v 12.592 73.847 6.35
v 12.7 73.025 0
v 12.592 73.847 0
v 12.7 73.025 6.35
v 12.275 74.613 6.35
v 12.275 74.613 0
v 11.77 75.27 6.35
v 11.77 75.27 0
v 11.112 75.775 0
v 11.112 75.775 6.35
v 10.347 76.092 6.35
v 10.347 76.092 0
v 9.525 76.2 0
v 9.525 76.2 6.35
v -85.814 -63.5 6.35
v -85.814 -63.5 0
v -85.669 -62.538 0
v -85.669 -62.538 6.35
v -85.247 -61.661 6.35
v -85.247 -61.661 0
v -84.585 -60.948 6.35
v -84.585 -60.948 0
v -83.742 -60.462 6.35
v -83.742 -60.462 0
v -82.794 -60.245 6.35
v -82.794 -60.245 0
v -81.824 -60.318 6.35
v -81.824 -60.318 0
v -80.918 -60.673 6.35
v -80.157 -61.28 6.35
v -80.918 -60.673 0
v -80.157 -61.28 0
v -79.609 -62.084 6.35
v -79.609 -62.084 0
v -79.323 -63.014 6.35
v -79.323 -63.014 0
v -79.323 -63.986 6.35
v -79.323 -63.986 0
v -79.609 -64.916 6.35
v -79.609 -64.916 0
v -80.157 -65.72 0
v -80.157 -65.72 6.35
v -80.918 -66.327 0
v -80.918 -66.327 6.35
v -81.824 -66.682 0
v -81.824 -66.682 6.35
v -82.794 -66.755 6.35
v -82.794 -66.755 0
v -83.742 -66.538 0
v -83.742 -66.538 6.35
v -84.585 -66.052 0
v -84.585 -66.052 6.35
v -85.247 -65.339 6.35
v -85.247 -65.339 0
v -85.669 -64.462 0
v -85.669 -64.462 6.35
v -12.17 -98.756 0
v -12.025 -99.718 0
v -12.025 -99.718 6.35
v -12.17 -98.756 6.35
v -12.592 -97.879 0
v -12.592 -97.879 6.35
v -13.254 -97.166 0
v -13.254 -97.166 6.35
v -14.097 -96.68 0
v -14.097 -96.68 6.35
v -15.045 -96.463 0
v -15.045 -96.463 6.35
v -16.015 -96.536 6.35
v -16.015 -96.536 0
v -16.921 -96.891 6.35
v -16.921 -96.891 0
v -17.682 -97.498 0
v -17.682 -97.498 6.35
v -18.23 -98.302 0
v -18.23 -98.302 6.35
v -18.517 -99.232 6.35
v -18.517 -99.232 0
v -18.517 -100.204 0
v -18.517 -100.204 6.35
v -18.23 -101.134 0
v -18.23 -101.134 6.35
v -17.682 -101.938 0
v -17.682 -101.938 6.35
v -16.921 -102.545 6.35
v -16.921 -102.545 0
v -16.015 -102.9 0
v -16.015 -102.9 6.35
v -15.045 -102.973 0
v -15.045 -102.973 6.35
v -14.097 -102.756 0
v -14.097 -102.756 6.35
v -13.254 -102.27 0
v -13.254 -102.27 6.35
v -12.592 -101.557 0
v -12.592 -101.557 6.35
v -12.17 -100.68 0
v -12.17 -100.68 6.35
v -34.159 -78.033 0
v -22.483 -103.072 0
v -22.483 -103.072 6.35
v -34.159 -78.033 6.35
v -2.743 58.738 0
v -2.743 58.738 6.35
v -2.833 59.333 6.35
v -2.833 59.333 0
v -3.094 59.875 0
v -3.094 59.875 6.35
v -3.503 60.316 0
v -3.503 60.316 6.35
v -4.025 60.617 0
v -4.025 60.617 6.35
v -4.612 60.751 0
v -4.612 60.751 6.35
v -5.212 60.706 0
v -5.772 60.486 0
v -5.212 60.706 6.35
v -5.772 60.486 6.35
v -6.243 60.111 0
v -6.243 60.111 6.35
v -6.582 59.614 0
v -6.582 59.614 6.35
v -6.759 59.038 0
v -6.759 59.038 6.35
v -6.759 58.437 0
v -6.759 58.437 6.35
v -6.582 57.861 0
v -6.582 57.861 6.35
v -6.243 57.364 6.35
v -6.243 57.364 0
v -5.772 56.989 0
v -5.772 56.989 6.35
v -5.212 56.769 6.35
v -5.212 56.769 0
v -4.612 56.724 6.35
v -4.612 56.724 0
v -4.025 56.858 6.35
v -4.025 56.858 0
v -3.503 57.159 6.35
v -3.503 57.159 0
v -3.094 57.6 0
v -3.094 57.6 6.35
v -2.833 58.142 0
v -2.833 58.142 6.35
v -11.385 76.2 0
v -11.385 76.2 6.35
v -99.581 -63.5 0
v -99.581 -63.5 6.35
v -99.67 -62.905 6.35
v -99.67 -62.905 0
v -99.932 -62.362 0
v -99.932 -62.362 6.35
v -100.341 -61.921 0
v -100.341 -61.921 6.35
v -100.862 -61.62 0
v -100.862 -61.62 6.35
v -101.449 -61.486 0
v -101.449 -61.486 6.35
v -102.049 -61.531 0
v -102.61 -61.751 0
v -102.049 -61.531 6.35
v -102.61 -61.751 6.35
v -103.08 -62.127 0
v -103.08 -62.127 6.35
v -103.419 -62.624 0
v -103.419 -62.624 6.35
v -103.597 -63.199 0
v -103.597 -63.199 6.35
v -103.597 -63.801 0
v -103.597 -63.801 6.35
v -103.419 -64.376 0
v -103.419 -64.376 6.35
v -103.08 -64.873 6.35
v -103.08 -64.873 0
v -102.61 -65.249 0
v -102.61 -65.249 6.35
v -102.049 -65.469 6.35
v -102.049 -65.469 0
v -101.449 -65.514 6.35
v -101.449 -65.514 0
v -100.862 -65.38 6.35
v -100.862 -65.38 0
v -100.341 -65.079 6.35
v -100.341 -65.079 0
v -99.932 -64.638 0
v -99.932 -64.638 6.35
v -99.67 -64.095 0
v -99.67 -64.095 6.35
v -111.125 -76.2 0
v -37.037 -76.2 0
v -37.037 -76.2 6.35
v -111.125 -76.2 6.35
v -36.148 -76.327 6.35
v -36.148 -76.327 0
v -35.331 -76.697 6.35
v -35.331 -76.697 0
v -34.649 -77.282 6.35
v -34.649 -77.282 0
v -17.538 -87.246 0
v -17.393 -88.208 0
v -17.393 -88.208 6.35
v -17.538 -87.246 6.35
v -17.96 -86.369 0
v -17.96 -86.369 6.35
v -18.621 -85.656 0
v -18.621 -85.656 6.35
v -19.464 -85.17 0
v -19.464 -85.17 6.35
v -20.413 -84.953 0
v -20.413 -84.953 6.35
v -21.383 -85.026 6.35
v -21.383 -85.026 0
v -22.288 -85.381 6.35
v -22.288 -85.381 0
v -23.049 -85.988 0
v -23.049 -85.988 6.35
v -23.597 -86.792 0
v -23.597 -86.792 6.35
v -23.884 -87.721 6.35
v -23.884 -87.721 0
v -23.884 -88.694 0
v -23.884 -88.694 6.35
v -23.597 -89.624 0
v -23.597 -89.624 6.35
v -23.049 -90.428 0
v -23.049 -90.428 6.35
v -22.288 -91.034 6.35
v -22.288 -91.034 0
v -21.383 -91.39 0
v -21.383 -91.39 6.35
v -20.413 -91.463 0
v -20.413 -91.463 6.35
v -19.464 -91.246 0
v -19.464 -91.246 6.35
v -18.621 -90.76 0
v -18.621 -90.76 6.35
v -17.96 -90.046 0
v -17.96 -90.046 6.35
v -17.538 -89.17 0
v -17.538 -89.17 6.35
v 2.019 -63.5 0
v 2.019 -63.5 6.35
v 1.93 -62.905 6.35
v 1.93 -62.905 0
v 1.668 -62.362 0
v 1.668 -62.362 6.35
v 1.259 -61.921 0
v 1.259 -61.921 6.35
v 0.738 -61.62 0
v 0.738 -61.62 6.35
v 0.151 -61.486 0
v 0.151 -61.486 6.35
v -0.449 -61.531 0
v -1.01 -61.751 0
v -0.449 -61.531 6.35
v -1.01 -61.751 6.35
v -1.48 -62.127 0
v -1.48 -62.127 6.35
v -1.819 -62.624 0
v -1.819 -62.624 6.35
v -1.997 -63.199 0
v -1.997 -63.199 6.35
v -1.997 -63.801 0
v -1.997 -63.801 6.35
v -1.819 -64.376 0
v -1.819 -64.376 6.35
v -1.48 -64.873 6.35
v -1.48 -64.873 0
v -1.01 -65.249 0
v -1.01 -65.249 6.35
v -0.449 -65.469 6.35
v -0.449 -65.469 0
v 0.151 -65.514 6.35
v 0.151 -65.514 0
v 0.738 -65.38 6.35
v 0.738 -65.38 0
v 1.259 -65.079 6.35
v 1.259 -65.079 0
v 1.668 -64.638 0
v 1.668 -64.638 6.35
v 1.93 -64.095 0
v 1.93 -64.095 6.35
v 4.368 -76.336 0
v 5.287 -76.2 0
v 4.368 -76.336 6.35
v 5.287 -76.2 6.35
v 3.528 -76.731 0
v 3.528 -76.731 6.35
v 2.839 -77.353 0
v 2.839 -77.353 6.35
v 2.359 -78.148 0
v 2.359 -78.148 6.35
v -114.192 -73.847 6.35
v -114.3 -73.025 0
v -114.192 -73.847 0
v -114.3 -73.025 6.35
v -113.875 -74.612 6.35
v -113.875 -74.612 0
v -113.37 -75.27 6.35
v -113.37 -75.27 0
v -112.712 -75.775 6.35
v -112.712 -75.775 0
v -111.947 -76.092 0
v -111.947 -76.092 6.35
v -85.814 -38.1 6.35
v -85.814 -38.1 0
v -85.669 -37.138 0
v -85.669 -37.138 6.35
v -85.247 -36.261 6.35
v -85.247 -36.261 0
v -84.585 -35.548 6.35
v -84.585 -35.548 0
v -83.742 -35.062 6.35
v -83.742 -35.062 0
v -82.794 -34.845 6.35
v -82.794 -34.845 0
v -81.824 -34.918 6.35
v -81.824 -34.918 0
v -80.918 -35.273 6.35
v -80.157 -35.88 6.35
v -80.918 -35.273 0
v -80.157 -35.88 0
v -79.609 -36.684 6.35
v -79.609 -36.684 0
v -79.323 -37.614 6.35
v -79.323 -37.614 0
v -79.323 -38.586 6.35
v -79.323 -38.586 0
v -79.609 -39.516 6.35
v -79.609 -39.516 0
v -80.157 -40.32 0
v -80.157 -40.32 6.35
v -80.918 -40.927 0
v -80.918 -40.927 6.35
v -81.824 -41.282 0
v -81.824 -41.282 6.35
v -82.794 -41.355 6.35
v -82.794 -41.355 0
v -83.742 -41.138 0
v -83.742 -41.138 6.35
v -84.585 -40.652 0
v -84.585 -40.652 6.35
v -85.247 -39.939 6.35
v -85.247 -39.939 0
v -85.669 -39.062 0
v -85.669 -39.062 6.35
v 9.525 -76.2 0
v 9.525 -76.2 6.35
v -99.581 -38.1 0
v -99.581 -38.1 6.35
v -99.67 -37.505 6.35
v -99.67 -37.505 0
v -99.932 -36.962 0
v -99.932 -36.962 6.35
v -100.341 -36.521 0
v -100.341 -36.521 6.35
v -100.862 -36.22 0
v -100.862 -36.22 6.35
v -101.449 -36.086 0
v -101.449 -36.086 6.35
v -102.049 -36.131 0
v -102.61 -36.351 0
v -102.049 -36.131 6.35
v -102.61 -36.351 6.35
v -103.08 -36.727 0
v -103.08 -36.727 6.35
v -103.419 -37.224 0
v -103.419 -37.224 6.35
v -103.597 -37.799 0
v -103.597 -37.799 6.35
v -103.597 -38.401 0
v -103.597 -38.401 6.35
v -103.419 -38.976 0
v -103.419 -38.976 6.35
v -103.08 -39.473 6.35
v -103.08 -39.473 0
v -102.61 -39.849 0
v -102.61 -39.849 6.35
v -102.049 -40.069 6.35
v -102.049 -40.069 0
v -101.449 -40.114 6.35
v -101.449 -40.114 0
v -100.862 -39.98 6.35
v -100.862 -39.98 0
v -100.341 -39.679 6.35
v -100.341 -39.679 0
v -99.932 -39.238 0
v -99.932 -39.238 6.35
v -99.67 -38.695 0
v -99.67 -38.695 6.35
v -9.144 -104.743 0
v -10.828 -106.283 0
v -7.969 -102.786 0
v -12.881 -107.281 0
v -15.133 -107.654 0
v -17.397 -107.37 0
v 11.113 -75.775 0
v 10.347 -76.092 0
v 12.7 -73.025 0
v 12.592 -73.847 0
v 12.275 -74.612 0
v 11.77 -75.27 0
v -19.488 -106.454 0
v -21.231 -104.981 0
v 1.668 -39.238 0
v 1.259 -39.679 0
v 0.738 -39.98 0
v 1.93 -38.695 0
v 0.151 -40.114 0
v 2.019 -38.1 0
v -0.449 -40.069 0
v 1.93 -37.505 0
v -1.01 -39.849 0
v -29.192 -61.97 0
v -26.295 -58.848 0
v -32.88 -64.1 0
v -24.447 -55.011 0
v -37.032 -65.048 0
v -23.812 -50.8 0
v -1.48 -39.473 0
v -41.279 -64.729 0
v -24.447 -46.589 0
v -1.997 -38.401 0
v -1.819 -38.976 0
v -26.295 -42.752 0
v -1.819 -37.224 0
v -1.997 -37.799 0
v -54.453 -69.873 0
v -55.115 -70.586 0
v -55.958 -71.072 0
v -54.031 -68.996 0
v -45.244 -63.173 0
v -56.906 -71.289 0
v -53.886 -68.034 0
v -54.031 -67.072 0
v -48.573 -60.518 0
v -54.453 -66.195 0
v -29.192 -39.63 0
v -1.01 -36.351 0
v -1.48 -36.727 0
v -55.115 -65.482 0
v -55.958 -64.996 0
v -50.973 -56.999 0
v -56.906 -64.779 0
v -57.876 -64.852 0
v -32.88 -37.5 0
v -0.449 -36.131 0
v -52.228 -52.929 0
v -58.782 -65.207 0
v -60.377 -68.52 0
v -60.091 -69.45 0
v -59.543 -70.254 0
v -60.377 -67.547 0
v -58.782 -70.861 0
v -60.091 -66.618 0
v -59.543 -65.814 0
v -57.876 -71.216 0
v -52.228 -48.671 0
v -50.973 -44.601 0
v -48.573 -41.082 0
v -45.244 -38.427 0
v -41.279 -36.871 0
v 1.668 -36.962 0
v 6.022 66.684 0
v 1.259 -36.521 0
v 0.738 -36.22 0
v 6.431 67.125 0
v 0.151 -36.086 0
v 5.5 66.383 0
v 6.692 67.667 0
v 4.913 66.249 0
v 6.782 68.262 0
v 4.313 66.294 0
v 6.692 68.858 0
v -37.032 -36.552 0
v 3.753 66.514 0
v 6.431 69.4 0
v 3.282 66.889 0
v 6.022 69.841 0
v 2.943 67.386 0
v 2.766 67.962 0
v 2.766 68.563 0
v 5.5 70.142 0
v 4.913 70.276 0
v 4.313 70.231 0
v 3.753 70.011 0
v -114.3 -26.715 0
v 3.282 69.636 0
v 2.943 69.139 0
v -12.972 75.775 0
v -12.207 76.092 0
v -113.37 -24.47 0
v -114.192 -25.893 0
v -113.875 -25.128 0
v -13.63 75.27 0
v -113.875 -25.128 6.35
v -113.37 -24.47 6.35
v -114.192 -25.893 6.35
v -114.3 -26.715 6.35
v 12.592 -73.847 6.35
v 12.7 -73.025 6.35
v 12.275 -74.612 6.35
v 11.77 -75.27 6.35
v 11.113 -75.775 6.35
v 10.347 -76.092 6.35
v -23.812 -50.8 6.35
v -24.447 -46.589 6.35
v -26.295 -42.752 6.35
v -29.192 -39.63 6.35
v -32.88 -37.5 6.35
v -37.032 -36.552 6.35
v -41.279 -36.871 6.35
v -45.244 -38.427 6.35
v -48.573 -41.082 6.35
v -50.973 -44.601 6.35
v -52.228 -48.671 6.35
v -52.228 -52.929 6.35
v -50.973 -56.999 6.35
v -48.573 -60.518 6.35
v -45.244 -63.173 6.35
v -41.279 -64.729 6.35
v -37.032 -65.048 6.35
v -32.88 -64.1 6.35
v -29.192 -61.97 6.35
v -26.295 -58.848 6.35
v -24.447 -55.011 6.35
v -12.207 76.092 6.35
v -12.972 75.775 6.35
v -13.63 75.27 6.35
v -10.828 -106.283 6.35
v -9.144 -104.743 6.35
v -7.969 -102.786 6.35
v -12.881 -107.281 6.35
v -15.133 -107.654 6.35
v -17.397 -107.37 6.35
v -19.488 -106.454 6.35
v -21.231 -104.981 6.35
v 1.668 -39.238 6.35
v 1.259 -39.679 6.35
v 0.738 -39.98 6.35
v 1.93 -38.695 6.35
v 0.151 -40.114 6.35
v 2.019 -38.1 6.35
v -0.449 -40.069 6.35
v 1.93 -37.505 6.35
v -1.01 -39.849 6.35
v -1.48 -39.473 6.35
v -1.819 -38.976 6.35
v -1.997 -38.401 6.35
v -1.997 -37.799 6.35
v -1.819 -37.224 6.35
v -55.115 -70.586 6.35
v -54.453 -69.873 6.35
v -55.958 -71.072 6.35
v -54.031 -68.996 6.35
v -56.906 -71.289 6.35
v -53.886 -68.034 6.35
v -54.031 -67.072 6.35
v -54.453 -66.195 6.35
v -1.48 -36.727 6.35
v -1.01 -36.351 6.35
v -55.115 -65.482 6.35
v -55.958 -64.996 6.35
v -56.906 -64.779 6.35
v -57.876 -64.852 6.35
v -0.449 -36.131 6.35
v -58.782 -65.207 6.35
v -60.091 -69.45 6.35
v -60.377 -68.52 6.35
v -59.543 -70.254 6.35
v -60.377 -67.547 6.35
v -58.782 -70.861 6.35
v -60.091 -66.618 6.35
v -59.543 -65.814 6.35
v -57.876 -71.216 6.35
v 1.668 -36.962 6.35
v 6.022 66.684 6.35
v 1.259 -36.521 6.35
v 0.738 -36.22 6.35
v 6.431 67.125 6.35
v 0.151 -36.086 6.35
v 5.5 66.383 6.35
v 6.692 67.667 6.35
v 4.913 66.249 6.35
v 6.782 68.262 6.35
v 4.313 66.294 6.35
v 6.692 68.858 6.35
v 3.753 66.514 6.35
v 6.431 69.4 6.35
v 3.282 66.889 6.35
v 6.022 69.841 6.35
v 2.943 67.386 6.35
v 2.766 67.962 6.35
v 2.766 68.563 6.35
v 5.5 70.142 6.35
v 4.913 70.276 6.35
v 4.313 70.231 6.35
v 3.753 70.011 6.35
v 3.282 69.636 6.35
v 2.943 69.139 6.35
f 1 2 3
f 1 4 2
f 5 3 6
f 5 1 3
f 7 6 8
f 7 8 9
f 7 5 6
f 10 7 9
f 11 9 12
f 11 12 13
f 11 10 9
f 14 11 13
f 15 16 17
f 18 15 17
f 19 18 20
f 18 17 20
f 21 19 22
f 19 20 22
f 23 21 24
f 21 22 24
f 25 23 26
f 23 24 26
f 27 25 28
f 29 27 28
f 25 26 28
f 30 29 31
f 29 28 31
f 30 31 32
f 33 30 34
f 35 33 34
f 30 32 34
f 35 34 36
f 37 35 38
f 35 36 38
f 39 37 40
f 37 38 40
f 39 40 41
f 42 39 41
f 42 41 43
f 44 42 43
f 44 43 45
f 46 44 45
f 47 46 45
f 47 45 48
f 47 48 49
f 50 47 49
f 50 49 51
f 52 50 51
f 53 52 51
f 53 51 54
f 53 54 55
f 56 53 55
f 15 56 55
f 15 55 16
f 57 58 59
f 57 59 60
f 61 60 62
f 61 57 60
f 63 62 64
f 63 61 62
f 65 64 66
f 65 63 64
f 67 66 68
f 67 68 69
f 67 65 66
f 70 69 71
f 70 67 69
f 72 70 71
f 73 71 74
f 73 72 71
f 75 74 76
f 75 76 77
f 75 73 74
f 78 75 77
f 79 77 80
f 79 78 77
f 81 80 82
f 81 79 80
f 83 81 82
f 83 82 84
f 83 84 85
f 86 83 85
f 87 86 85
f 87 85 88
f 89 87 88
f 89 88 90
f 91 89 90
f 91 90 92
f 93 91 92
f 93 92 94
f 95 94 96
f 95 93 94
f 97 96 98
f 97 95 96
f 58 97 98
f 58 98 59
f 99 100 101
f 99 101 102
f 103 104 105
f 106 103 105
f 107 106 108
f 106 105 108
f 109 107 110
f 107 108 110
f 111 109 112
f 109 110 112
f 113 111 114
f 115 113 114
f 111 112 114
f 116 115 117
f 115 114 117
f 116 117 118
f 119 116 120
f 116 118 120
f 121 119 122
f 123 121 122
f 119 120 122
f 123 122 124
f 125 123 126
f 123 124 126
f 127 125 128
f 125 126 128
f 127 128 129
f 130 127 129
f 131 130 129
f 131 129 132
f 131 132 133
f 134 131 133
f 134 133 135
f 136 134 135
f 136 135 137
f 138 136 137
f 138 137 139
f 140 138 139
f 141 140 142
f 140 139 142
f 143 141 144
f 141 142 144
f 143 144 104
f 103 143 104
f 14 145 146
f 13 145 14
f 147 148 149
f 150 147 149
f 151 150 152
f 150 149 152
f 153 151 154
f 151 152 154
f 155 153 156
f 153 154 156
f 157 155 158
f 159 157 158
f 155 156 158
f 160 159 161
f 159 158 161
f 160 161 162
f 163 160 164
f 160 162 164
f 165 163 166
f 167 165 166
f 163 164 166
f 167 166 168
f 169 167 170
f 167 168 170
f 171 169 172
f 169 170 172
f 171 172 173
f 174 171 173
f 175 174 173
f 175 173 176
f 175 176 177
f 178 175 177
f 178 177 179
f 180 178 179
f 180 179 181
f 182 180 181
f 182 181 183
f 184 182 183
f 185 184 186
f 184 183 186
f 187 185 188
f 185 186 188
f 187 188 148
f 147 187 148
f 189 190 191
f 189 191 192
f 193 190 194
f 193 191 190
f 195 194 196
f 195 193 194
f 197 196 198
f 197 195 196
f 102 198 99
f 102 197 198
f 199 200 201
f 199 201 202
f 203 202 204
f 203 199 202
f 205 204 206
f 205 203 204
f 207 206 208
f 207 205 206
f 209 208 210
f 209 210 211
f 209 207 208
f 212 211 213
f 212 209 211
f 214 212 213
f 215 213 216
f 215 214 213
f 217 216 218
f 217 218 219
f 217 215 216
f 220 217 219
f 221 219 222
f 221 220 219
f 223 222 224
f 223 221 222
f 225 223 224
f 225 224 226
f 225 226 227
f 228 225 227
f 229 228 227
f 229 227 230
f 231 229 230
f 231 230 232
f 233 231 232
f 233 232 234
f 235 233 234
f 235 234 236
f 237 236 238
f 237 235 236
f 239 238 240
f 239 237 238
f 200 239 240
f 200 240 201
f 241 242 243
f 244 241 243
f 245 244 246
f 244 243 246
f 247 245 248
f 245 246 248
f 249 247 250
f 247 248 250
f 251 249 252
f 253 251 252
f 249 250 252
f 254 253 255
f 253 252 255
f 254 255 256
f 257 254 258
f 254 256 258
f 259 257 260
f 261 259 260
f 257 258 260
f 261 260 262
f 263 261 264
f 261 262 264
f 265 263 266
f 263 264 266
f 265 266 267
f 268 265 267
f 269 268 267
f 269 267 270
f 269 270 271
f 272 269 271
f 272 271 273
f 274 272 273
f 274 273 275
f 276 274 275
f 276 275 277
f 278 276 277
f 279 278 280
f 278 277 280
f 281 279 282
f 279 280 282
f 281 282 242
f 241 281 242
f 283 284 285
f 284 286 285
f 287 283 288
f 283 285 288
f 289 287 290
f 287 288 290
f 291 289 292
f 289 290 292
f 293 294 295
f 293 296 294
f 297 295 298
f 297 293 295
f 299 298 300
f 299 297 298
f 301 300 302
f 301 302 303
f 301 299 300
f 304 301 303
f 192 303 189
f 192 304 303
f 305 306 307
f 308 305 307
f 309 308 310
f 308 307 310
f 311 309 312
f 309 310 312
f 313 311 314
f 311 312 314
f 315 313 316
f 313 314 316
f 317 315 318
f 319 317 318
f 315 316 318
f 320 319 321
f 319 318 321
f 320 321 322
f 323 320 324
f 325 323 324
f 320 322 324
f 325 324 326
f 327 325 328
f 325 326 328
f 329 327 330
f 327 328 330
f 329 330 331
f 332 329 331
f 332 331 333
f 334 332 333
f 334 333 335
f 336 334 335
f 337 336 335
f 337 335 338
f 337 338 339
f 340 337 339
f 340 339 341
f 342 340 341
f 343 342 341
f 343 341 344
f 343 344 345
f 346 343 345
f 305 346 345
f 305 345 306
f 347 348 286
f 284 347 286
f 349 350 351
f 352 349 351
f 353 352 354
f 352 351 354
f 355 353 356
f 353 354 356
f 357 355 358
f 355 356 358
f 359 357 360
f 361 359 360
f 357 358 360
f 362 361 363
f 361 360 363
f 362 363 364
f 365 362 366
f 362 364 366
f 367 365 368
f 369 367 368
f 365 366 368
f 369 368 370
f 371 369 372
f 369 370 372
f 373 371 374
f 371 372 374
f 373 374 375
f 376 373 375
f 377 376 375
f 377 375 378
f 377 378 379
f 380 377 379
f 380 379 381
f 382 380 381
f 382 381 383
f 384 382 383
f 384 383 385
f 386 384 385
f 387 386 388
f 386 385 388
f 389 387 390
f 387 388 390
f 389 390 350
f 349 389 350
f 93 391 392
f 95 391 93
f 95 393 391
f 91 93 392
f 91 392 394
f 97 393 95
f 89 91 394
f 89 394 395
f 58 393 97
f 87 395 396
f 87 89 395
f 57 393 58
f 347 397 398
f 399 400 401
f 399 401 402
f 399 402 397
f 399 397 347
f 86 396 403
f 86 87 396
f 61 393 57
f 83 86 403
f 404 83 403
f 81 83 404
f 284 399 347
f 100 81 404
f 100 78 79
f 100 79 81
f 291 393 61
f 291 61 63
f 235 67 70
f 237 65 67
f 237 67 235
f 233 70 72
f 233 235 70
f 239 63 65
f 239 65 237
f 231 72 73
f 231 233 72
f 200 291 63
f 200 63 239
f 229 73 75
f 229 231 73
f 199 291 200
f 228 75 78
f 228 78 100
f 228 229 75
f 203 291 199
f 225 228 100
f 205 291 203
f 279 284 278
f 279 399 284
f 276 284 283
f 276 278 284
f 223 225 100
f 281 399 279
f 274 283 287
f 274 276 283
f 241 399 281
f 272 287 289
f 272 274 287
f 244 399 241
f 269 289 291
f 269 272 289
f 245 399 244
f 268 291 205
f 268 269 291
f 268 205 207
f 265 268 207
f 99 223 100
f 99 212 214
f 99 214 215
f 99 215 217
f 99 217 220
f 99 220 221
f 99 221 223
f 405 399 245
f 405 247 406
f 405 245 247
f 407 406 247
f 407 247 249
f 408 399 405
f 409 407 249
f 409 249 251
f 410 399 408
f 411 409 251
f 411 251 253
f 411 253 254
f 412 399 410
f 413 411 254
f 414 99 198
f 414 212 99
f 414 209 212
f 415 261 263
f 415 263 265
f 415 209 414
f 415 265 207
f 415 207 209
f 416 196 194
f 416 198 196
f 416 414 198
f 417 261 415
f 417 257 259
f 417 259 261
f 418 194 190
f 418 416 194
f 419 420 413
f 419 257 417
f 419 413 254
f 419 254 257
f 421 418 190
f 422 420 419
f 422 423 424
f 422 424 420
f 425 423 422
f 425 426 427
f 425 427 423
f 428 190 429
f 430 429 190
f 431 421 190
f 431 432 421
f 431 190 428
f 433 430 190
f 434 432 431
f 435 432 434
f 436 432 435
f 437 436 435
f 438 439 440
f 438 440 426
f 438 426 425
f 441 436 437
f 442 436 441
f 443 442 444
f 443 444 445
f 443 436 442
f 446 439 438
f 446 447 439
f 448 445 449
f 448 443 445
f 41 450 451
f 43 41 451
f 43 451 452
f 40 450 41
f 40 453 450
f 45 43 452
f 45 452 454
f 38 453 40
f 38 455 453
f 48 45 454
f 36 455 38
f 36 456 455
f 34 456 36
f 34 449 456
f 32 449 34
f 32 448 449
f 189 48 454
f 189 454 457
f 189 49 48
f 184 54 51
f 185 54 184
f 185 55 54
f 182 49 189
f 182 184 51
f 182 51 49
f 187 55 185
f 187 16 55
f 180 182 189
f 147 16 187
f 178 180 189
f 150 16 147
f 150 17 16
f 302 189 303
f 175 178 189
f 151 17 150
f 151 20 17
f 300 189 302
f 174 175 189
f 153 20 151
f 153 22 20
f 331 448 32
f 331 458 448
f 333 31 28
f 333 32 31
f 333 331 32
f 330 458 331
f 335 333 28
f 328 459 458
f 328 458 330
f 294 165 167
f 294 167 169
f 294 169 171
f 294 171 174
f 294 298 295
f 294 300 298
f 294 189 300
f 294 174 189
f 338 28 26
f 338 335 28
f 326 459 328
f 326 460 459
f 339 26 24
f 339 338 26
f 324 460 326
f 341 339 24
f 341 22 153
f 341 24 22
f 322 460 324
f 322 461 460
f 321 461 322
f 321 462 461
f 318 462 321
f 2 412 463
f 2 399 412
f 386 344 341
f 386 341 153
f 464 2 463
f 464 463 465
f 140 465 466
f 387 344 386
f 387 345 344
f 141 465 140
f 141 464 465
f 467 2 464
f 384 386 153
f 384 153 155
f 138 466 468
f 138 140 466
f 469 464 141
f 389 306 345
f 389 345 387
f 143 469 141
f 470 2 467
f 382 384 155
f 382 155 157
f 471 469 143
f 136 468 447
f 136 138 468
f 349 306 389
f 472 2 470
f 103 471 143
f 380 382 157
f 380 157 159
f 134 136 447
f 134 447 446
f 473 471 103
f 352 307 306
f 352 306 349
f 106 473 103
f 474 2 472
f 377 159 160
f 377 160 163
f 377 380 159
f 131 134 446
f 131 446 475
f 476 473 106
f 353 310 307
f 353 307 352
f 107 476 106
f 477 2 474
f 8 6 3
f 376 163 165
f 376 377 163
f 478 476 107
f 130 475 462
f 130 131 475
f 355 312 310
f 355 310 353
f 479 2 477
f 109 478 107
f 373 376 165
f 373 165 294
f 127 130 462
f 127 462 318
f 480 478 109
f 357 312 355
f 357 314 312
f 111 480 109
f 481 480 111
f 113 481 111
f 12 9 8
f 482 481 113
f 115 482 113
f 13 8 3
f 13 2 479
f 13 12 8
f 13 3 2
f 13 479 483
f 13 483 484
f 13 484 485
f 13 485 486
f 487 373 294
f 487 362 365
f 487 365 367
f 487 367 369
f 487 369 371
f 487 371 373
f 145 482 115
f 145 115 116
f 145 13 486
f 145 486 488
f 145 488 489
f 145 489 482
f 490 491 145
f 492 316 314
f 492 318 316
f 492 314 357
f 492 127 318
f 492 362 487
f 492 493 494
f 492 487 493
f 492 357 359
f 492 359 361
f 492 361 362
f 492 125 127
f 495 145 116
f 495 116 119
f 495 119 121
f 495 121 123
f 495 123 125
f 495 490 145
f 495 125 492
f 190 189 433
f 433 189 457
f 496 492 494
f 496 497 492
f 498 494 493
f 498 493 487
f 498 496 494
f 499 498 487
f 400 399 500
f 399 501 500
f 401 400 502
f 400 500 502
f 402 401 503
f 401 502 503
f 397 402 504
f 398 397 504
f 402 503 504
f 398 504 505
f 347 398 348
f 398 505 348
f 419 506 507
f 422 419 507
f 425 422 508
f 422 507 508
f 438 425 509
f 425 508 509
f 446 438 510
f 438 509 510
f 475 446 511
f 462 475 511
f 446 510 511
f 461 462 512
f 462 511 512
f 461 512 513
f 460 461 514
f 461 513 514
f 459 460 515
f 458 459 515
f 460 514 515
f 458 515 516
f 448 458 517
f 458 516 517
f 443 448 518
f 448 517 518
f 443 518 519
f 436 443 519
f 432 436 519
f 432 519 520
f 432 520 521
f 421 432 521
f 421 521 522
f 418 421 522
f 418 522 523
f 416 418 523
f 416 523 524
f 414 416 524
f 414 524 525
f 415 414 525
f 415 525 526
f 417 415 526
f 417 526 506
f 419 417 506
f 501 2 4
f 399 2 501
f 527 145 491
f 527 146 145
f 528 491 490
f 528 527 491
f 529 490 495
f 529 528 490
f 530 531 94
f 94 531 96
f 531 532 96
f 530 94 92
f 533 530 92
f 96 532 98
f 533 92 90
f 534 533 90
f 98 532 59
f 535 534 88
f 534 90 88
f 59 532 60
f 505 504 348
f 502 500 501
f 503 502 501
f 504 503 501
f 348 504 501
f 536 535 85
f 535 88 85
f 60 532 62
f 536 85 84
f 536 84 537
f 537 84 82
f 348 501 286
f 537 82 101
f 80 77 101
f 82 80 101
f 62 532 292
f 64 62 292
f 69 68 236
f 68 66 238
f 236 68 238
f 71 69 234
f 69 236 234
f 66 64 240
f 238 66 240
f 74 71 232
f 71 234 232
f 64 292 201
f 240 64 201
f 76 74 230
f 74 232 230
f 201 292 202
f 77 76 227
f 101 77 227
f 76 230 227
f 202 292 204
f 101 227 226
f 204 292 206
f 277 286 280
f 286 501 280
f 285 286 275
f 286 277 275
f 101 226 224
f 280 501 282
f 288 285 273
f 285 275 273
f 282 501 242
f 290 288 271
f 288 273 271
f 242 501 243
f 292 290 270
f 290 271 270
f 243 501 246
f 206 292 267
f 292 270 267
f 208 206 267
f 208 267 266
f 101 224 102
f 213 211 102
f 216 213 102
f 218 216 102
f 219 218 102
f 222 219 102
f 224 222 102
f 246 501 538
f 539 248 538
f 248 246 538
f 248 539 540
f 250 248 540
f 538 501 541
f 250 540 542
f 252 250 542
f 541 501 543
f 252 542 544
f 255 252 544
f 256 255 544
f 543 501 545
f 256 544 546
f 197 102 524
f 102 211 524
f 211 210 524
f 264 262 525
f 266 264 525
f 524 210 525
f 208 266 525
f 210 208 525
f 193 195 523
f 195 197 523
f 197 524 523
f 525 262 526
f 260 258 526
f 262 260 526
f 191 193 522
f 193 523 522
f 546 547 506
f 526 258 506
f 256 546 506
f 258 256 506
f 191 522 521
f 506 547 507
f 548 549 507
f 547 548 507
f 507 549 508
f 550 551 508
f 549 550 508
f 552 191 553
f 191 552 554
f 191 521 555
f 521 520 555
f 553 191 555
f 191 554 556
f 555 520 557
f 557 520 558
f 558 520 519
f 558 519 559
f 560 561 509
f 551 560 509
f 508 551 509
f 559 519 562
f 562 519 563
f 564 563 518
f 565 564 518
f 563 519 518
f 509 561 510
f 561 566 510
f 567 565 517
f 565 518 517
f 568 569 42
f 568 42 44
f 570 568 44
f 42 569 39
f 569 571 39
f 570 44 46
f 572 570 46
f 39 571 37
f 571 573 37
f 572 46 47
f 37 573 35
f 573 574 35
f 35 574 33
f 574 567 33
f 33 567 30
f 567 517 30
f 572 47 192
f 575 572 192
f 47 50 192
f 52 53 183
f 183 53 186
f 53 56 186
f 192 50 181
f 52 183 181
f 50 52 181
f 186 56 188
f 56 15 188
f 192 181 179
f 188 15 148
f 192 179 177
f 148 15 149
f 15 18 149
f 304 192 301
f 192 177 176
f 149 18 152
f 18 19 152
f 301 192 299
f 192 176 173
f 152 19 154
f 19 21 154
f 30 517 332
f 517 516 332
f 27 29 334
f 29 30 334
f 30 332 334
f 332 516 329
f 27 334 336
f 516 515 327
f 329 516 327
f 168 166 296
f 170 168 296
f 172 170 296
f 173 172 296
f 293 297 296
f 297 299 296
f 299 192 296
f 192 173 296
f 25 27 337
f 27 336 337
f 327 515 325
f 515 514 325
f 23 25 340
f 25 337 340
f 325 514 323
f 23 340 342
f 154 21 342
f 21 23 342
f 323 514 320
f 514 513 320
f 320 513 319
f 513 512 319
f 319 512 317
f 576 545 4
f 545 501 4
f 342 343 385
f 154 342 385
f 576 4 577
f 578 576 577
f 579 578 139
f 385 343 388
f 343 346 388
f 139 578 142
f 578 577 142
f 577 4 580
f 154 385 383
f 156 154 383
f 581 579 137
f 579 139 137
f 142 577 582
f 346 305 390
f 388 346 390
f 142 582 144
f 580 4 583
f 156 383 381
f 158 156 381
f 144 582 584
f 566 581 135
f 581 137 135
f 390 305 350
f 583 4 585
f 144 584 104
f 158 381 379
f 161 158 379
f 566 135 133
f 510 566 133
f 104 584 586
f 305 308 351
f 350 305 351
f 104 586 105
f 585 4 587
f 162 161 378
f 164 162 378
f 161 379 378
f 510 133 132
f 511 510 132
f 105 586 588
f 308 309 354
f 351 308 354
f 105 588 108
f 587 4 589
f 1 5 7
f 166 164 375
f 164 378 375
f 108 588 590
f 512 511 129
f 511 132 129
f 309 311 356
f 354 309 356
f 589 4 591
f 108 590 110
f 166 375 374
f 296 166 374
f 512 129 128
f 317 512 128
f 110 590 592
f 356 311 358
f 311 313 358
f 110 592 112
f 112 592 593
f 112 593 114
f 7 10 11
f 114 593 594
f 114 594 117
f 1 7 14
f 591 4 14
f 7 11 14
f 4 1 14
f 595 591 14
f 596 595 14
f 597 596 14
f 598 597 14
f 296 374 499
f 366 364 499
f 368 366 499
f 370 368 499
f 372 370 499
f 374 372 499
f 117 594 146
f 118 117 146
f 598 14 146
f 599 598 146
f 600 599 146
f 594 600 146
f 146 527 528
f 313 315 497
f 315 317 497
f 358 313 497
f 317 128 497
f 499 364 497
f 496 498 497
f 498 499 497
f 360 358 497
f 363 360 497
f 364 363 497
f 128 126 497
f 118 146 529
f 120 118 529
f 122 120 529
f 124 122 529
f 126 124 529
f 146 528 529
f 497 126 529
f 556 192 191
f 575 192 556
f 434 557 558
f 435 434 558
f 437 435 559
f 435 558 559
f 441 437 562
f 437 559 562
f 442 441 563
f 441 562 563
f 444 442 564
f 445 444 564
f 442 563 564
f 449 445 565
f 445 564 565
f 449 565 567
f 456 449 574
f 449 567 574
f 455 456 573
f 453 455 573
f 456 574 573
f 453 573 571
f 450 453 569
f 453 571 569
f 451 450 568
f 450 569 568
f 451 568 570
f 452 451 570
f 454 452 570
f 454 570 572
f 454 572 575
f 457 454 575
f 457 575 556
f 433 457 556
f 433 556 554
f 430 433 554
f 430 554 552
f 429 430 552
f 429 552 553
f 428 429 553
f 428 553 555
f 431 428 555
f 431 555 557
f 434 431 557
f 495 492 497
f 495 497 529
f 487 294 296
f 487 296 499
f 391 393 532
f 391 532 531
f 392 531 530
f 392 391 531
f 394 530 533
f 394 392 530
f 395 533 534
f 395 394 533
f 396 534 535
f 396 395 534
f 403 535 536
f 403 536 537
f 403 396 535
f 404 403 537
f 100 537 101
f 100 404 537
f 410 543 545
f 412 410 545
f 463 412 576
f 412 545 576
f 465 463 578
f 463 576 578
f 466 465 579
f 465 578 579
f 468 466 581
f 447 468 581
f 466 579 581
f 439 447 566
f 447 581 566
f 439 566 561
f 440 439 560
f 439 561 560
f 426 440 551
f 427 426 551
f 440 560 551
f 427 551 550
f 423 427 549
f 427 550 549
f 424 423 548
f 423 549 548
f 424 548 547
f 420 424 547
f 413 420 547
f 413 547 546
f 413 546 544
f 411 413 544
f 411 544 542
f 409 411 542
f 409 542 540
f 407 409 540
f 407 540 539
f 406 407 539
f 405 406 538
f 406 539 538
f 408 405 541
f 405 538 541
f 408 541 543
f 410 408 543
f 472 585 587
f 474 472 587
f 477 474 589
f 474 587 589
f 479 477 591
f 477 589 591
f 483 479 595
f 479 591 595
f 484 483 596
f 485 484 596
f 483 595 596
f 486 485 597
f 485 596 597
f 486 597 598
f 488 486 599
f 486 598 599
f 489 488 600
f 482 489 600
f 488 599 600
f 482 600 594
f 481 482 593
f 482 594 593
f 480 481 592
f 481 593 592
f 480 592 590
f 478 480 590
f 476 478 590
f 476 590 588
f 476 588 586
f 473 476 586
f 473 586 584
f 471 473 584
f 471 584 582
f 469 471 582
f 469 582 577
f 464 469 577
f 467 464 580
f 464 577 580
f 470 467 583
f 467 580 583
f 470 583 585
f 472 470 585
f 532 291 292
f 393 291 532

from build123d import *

# Parameters (mm, degrees)
SKETCH1_R                = 3.2639
BOSS_EXTRUDE1_DEPTH      = 6.35
SKETCH2_R                = 2.0193
CUT_EXTRUDE1_DEPTH       = 6.35
SKETCH3_R                = 2.0193
CUT_EXTRUDE2_DEPTH       = 6.35
SKETCH5_R                = 2.0193
CUT_EXTRUDE3_DEPTH       = 6.35
SKETCH6_R                = 14.2875
CUT_EXTRUDE4_DEPTH       = 7.35
SKETCH7_R                = 3.2639
CUT_EXTRUDE5_DEPTH       = 7.35
F_0_257_DIAMETER_HOLE1_D = 6.5278
FILLET1_R                = 3.175
FILLET2_R                = 3.175


with BuildPart() as part:
    # Sketch1 → Boss-Extrude1 (new body)
    with BuildSketch(Plane.XY):
        with BuildLine():
            Line((-12.7, 76.2), (12.7, 76.2))
            Line((12.7, 76.2), (12.7, -76.2))
            Line((12.7, -76.2), (3.175, -76.2))
            Line((3.175, -76.2), (-7.968733256, -102.786346034))
            ThreePointArc((-7.968733256, -102.786346034), (-15.132721636, -107.653920671), (-22.482997382, -103.072495258))
            Line((-22.482997382, -103.072495258), (-35.013847715, -76.2))
            Line((-35.013847715, -76.2), (-114.3, -76.2))
            Line((-114.3, -76.2), (-114.3, -25.4))
            Line((-114.3, -25.4), (-12.7, 76.2))
        make_face()
        with Locations((-15.289179323, -99.717962805)):
            Circle(SKETCH1_R, mode=Mode.SUBTRACT)
        with Locations((-20.656431247, -88.20785391)):
            Circle(SKETCH1_R, mode=Mode.SUBTRACT)
    extrude(amount=BOSS_EXTRUDE1_DEPTH)

    # Sketch2 → Cut-Extrude1 (cut)
    with BuildSketch(Plane.XY.offset(6.35)):
        with Locations((4.7625, 68.2625)):
            Circle(SKETCH2_R)
        with Locations((-4.7625, 58.7375)):
            Circle(SKETCH2_R)
    extrude(amount=-CUT_EXTRUDE1_DEPTH, mode=Mode.SUBTRACT)

    # Sketch3 → Cut-Extrude2 (cut)
    with BuildSketch(Plane.XY.offset(6.35)):
        with Locations((0, -63.5)):
            Circle(SKETCH3_R)
        with Locations((0, -38.1)):
            Circle(SKETCH3_R)
    extrude(amount=-CUT_EXTRUDE2_DEPTH, mode=Mode.SUBTRACT)

    # Sketch5 → Cut-Extrude3 (cut)
    with BuildSketch(Plane.XY.offset(6.35)):
        with Locations((-101.6, -63.5)):
            Circle(SKETCH5_R)
        with Locations((-101.6, -38.1)):
            Circle(SKETCH5_R)
    extrude(amount=-CUT_EXTRUDE3_DEPTH, mode=Mode.SUBTRACT)

    # Sketch6 → Cut-Extrude4 (cut, through all)
    with BuildSketch(Plane.XY.offset(6.35)):
        with Locations((-38.1, -50.8)):
            Circle(SKETCH6_R)
    extrude(amount=-CUT_EXTRUDE4_DEPTH, mode=Mode.SUBTRACT)

    # Sketch7 → Cut-Extrude5 (cut, through all)
    with BuildSketch(Plane.XY.offset(6.35)):
        with Locations((-57.15, -68.0339)):
            Circle(SKETCH7_R)
    extrude(amount=-CUT_EXTRUDE5_DEPTH, mode=Mode.SUBTRACT)

    # F (0.257) Diameter Hole1 (through all)
    with Locations(Plane.XY.offset(6.35)):
        with Locations((-82.55, -38.1), (-82.55, -63.5)):
            Hole(F_0_257_DIAMETER_HOLE1_D / 2)

    # Fillet1
    fillet1_edges = [part.edges().sort_by_distance(p)[0] for p in [
        (12.7, -76.2, 3.175),
        (3.175, -76.2, 3.175),
        (-35.013847715, -76.2, 3.175),
    ]]
    fillet(fillet1_edges, radius=FILLET1_R)

    # Fillet2
    fillet2_edges = [part.edges().sort_by_distance(p)[0] for p in [
        (-114.3, -76.2, 3.175),
        (-114.3, -25.4, 3.175),
        (-12.7, 76.2, 3.175),
        (12.7, 76.2, 3.175),
    ]]
    fillet(fillet2_edges, radius=FILLET2_R)


solid = part.part
